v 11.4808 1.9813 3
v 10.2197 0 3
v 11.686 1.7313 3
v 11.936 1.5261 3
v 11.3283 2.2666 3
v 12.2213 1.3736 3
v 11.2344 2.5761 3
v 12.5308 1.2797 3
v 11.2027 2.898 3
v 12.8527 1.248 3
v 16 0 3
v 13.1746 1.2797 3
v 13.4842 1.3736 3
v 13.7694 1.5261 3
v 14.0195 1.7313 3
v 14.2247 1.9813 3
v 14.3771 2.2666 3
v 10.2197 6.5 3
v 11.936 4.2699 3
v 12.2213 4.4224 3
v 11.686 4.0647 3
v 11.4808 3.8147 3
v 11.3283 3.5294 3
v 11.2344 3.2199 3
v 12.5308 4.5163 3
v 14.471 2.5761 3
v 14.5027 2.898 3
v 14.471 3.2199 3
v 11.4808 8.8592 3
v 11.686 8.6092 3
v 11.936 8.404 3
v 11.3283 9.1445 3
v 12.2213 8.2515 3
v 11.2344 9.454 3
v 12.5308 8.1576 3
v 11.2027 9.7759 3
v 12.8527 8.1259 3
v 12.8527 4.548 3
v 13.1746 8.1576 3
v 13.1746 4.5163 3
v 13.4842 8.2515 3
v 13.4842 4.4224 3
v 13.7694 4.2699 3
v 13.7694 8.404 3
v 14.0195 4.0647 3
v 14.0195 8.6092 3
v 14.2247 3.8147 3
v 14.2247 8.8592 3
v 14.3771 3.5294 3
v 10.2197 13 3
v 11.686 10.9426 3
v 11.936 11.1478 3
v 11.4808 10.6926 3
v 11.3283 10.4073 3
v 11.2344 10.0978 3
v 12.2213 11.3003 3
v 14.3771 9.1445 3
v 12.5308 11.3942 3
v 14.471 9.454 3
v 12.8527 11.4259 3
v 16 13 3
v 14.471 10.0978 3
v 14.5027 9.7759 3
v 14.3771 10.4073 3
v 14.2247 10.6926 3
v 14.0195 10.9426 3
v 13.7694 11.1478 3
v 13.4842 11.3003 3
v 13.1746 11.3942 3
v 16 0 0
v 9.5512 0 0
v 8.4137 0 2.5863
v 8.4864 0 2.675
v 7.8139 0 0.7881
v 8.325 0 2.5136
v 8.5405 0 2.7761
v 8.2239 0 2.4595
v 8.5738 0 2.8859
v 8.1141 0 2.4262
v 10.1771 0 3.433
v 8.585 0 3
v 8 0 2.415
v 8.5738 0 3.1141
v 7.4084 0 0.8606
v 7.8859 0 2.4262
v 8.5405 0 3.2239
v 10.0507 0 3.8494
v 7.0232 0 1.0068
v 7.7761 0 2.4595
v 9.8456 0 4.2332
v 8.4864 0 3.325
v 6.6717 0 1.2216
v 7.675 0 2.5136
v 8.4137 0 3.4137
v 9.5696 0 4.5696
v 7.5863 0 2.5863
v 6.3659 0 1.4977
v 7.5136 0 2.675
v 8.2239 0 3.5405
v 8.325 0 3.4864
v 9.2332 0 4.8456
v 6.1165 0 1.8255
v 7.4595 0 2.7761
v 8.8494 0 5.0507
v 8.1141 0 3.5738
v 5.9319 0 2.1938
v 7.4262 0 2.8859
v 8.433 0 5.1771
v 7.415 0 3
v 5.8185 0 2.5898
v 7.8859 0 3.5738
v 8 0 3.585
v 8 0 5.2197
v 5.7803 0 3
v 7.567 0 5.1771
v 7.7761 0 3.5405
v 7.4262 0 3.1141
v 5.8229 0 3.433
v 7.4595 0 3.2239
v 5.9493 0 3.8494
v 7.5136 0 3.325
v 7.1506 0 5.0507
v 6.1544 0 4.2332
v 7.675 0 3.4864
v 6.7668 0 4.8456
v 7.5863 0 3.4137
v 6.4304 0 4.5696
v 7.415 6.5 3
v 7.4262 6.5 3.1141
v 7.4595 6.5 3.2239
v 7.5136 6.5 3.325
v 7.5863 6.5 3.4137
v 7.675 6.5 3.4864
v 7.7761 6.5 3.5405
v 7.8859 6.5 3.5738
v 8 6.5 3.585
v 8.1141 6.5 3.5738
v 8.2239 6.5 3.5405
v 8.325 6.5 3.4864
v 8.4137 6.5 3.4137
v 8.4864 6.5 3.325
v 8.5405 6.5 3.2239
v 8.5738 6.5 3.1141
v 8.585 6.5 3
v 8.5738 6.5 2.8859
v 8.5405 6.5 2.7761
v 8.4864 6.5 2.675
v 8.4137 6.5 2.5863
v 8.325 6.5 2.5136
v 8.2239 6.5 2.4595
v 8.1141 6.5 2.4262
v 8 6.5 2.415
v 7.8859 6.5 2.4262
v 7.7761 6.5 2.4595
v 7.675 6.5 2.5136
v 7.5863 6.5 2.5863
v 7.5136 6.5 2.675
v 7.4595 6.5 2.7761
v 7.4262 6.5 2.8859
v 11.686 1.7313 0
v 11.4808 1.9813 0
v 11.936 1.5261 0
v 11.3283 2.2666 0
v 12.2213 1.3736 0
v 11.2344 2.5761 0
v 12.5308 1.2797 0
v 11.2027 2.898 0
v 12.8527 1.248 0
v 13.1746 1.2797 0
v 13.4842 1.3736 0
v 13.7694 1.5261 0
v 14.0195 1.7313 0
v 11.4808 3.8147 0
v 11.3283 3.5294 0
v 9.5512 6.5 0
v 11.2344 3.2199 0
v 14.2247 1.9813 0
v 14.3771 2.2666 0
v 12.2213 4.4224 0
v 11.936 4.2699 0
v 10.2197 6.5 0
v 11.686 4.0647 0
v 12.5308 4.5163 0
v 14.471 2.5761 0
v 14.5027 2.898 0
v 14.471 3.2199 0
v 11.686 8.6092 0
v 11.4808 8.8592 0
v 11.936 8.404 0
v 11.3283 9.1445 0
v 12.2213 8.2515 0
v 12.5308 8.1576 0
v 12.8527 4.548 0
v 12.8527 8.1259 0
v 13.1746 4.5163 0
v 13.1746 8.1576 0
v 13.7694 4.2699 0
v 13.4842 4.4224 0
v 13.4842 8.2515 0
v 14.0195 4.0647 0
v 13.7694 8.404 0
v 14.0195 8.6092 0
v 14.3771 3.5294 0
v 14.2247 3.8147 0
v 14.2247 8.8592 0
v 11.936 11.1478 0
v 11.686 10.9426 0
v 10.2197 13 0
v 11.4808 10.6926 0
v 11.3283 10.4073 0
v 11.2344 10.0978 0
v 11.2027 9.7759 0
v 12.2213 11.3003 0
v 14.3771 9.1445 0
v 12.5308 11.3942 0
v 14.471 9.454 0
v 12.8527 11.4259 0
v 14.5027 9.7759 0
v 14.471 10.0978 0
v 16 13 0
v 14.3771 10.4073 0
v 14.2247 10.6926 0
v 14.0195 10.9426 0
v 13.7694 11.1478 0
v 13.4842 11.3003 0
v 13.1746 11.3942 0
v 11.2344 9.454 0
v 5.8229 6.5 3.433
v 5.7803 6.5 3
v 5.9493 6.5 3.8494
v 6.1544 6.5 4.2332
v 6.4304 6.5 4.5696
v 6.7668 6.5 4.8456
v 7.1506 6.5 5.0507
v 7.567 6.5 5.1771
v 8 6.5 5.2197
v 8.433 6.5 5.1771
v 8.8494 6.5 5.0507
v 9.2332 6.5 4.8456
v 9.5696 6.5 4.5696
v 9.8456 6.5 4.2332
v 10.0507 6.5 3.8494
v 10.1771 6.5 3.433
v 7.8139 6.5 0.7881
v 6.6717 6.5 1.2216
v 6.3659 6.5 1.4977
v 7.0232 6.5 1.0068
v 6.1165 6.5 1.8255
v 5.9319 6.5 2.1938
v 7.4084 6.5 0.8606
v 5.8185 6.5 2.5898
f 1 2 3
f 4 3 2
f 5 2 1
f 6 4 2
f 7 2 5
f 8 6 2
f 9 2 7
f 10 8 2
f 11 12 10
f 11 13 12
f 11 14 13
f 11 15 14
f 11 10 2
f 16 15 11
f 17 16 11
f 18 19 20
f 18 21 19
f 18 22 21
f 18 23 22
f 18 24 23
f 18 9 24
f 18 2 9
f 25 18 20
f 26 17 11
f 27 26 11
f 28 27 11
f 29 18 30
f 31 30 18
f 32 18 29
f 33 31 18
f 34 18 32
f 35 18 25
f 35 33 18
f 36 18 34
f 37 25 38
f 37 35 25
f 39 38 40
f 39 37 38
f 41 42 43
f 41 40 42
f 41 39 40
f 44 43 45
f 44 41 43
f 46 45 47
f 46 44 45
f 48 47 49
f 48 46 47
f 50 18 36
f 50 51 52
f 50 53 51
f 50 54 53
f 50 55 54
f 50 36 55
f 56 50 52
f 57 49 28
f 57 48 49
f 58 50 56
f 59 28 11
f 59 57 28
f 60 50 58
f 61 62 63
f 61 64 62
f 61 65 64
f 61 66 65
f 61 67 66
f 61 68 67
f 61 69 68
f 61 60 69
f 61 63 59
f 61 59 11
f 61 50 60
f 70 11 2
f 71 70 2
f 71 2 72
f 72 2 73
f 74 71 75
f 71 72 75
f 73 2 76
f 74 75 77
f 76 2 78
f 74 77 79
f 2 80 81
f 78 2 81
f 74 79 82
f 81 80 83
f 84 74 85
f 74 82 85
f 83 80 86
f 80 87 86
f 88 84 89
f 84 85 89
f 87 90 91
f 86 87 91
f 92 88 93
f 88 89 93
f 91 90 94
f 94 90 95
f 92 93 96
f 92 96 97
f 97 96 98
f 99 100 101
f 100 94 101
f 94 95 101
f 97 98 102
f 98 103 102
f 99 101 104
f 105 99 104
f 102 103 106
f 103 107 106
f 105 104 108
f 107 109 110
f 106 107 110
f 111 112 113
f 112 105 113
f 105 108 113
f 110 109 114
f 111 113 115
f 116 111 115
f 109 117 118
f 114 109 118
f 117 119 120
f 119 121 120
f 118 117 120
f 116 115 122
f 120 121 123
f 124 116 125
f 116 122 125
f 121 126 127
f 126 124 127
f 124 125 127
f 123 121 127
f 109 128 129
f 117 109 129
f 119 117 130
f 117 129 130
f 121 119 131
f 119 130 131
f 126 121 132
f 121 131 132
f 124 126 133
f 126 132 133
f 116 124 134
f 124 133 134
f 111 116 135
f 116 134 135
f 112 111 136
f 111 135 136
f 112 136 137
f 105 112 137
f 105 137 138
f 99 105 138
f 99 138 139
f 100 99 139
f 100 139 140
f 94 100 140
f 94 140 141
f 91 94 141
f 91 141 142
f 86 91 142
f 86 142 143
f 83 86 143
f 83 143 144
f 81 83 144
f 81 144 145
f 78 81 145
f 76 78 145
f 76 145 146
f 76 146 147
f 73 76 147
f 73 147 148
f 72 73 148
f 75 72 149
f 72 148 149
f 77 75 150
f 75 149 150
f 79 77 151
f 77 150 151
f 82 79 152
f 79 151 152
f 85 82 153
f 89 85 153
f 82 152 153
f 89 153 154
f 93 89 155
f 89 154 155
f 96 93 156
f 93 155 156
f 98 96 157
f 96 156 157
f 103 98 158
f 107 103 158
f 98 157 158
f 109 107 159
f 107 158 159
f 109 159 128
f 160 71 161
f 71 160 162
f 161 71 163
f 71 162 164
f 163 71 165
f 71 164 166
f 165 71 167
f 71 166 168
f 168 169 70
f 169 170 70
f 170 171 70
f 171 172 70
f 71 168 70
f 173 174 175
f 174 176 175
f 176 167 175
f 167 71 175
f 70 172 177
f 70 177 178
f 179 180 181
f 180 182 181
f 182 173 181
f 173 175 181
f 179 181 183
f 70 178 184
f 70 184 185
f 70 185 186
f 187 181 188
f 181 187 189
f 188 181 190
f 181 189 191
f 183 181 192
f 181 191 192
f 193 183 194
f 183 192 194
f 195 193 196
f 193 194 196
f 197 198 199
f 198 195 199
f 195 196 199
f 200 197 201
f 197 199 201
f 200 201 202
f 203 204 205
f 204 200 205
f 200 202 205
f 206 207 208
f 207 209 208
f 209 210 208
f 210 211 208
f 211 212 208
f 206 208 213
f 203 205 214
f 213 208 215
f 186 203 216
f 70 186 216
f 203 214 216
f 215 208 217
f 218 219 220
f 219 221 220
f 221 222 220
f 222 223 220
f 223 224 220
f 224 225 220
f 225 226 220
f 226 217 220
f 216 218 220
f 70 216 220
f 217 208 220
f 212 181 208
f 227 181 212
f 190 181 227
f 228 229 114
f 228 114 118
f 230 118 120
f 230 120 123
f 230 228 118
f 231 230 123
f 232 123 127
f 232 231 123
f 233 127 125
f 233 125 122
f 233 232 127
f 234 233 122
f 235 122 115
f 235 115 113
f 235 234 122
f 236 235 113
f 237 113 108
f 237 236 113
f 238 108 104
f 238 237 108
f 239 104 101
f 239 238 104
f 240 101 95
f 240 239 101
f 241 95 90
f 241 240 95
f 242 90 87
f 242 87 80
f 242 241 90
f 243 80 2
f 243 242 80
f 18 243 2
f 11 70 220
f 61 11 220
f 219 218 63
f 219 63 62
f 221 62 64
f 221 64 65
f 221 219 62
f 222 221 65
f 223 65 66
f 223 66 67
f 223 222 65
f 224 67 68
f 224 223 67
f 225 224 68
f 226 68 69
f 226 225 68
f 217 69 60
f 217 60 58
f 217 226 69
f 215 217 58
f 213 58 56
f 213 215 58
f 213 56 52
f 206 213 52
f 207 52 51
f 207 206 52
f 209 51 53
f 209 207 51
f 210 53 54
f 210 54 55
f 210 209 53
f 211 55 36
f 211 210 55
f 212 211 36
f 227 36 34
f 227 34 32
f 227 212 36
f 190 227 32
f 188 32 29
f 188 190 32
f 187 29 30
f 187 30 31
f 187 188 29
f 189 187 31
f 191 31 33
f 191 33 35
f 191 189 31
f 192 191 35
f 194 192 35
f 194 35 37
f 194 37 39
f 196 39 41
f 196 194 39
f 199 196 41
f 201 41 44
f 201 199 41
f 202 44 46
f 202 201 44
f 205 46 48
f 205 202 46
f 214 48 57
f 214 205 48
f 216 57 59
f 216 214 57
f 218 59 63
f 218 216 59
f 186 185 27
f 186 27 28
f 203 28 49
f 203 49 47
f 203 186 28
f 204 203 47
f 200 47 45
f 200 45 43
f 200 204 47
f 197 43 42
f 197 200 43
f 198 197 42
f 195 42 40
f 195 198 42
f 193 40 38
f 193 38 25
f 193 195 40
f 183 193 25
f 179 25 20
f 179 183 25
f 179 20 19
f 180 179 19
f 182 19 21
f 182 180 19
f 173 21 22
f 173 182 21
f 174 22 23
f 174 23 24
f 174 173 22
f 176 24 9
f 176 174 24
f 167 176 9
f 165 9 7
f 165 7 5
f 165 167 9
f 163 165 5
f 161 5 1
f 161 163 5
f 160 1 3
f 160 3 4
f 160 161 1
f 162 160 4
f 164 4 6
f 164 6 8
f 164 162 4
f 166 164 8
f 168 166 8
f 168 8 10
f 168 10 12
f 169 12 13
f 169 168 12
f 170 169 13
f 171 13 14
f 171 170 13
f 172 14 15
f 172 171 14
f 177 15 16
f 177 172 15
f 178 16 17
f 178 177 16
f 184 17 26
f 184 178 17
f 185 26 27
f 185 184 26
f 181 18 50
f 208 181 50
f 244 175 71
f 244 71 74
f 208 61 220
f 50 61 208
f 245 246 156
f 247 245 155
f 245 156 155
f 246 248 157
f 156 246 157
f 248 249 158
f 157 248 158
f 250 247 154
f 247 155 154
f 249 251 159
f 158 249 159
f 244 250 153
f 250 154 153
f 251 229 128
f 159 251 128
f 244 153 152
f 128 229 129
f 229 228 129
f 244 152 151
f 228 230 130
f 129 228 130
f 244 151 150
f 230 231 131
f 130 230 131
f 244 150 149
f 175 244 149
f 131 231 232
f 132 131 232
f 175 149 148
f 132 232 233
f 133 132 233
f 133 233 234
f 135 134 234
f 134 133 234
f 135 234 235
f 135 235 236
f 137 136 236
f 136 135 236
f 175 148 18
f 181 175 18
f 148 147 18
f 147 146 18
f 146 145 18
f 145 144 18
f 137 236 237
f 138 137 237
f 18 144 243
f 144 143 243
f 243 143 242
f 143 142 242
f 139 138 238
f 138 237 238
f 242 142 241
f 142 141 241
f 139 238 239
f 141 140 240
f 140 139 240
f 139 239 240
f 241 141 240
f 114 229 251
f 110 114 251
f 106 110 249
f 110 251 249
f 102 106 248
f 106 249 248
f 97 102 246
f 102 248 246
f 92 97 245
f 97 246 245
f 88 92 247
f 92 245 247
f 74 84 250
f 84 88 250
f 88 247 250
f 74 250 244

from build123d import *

# Parameters (mm, degrees)
F0_W           = 16
F0_H           = 13
F0_R           = 1.65
F1_DEPTH       = 3
F2_R           = 2.2197148543
F3_DEPTH       = 13
F4_R           = 0.585
F5_DEPTH       = 25
F7_DEPTH       = 25
F9_DEPTH       = 13
F10_W          = 7.79368474
F10_H          = 8.6547567695
F11_DEPTH      = 25
F11_DEPTH_BACK = 25


with BuildPart() as f1:
    # F0 (on Top) → F1 (new body)
    with BuildSketch(Plane.XY):
        with Locations((8, 6.5)):
            Rectangle(F0_W, F0_H)
        with Locations((3.1225297134, 2.8979986639)):
            Circle(F0_R, mode=Mode.SUBTRACT)
        with Locations((12.8527397134, 2.8979986639)):
            Circle(F0_R, mode=Mode.SUBTRACT)
        with Locations((3.1225297134, 9.7759086639)):
            Circle(F0_R, mode=Mode.SUBTRACT)
        with Locations((12.8527397134, 9.7759086639)):
            Circle(F0_R, mode=Mode.SUBTRACT)
    extrude(amount=F1_DEPTH)

    # F2 (on face) → F3 (join, through all)
    with BuildSketch(Plane(origin=(0, 13, 0), x_dir=(-1, 0, 0), z_dir=(0, 1, 0))):
        with Locations((-8, 3)):
            Circle(F2_R)
    extrude(amount=-F3_DEPTH)

    # F4 (on face) → F5 (cut)
    with BuildSketch(Plane(origin=(0, 13, 0), x_dir=(-1, 0, 0), z_dir=(0, 1, 0))):
        with Locations((-8, 3)):
            Circle(F4_R)
        Polygon((-8, 0.8955585654), (-9.5511529364, 0), (-6.4488470636, 0), align=None)
    extrude(amount=-F5_DEPTH, mode=Mode.SUBTRACT)

    # F6 (on face) → F7 (cut)
    with BuildSketch(Plane(origin=(0, 13, 0), x_dir=(-1, 0, 0), z_dir=(0, 1, 0))):
        with BuildLine():
            ThreePointArc((-5.7802851457, 3), (-6.4976685136, 1.3659454907), (-8.1861204126, 0.7881018951))
            Line((-8.1861204126, 0.7881018951), (-9.5511529364, 0))
            Line((-9.5511529364, 0), (0, -1.0680041742))
            Line((0, -1.0680041742), (0, 3))
            Line((0, 3), (-5.7802851457, 3))
        make_face()
    extrude(amount=-F7_DEPTH, mode=Mode.SUBTRACT)

    # F8 (on face) → F9 (join, through all)
    with BuildSketch(Plane(origin=(0, 13, 0), x_dir=(-1, 0, 0), z_dir=(0, 1, 0))):
        Polygon((-8, 0.8955585654), (-9.5511529364, 0), (-7.8138795874, 0.7881018951), align=None)
    extrude(amount=-F9_DEPTH)

    # F10 (on face) → F11 (cut, two sides)
    with BuildSketch(Plane.XY.offset(3)) as f11_sk:
        with Locations((6.3228724843, 10.8273783848)):
            Rectangle(F10_W, F10_H)
    extrude(amount=-F11_DEPTH, mode=Mode.SUBTRACT)
    extrude(f11_sk.sketch, amount=F11_DEPTH_BACK, mode=Mode.SUBTRACT)


solid = f1.part
